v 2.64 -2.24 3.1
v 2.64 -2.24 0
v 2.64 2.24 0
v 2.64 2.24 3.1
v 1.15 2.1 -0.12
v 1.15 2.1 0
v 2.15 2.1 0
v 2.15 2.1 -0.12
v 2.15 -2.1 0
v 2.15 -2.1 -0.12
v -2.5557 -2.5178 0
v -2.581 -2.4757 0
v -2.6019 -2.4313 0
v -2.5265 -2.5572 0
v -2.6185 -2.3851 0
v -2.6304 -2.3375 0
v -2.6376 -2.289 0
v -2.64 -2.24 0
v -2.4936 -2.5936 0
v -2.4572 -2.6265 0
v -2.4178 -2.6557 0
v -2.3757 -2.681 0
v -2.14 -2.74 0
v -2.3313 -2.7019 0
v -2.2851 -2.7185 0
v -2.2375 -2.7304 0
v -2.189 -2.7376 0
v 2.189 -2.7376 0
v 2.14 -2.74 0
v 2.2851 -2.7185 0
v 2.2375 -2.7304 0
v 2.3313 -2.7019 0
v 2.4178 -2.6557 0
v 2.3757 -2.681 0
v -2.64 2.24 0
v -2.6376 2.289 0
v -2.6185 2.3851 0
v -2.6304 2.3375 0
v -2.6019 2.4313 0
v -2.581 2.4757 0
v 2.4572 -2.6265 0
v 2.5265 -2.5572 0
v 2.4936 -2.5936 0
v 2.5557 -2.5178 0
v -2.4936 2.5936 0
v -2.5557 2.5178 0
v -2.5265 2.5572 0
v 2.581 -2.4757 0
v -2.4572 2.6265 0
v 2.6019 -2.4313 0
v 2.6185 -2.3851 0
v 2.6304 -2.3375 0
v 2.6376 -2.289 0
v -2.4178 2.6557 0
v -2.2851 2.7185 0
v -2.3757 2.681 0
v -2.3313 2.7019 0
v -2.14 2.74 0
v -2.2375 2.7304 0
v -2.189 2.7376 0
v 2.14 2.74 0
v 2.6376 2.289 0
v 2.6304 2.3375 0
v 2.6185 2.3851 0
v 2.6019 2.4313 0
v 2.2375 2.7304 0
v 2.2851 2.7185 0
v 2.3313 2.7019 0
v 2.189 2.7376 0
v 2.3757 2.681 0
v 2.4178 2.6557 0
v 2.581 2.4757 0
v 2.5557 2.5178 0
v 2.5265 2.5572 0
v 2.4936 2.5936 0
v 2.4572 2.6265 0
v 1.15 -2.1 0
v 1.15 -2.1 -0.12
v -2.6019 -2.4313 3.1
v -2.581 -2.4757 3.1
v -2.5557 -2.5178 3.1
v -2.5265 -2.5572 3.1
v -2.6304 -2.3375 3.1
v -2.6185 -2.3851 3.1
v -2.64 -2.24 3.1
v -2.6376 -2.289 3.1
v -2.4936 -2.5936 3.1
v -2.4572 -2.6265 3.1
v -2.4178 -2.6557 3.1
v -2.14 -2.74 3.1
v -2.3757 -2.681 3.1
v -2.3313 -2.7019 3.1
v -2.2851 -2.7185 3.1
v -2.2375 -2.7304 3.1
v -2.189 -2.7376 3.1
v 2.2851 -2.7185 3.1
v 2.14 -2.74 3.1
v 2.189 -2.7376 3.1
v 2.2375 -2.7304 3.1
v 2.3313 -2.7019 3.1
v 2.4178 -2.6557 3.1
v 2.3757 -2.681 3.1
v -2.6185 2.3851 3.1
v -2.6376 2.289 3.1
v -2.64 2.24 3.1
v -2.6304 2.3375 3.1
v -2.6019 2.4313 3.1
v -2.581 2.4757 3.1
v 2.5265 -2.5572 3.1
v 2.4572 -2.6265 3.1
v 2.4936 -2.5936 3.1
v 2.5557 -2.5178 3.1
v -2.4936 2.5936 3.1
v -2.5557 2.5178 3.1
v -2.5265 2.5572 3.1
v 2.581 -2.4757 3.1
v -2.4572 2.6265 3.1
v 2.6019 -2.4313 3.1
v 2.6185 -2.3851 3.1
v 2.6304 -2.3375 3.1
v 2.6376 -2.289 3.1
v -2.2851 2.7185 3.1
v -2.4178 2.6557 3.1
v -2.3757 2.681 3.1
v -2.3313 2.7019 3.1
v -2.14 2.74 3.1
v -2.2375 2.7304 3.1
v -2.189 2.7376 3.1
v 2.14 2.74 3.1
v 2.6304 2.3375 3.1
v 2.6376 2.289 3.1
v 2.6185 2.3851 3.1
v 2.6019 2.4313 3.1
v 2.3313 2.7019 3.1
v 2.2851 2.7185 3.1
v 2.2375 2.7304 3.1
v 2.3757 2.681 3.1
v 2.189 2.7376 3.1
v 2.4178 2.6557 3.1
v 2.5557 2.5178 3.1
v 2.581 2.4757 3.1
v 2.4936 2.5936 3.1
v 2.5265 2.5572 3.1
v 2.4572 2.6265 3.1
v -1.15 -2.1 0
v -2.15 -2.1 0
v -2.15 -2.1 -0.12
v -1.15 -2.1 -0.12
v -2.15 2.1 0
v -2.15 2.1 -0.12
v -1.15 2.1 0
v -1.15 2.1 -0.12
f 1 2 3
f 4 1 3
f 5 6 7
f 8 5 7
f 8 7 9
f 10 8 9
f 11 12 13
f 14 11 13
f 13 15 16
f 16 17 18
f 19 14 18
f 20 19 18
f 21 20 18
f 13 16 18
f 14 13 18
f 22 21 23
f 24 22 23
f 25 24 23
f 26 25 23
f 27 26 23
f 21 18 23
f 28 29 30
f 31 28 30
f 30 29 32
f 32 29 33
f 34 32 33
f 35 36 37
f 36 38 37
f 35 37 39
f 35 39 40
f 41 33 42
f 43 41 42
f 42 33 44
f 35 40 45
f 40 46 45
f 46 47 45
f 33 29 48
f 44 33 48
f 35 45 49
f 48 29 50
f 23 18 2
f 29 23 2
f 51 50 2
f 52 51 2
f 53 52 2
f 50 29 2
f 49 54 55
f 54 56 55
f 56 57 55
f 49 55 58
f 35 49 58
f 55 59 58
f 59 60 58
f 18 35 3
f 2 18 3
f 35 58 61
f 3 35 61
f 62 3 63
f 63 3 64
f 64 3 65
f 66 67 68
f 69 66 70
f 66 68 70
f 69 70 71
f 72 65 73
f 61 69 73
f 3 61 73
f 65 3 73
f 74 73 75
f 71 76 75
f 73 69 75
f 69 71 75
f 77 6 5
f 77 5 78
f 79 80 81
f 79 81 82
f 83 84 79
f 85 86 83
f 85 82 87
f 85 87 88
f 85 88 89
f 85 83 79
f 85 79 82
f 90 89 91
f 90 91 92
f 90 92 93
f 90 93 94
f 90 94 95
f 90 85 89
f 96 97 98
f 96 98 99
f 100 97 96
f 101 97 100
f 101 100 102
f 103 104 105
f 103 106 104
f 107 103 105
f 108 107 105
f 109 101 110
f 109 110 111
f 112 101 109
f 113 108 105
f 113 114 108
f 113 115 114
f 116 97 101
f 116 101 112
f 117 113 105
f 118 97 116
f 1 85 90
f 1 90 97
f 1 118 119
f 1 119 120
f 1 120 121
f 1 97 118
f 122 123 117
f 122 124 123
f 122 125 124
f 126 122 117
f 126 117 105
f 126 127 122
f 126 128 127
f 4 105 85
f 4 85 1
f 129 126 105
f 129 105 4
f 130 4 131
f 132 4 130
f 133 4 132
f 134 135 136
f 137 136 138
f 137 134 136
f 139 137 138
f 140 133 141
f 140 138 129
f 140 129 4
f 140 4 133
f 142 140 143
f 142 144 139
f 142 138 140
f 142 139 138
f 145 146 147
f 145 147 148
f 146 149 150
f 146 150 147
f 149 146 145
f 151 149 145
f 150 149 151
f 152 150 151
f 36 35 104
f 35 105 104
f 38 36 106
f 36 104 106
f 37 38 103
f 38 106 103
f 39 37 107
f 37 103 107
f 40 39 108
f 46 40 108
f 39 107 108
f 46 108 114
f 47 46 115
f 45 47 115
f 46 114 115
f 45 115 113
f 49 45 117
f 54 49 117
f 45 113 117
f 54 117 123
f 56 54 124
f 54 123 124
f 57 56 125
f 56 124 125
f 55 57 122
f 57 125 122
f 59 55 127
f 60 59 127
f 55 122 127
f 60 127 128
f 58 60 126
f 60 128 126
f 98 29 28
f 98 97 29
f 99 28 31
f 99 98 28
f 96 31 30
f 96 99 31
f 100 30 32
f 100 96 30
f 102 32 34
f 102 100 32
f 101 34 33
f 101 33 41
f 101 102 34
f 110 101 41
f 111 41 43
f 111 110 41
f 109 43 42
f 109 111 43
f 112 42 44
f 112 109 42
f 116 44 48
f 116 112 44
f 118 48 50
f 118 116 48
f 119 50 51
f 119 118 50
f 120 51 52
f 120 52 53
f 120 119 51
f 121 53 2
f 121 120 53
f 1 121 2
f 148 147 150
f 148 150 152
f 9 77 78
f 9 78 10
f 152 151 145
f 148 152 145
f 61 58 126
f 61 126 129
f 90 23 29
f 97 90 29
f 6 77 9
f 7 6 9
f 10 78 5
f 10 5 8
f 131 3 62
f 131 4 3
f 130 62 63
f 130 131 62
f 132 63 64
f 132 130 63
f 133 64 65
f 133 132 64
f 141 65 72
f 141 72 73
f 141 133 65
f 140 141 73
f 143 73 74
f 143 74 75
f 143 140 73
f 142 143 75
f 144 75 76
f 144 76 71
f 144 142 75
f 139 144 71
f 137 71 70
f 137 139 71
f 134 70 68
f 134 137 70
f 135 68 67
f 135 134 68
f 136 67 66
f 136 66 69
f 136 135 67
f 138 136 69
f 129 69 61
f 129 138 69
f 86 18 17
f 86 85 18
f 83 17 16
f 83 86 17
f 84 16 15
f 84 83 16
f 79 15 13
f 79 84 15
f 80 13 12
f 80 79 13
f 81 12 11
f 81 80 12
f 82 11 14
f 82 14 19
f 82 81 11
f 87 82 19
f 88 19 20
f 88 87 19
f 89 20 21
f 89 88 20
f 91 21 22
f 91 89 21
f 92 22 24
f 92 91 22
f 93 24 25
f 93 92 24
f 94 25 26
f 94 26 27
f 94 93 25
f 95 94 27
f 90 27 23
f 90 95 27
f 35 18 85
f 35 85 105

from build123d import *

# Parameters (mm, degrees)
F0_W     = 5.28
F0_H     = 5.48
F1_DEPTH = 3.1
F2_R     = 0.5
F3_W     = 1
F3_H     = 4.2
F4_DEPTH = 0.12


with BuildPart() as f1:
    # F0 (on Top) → F1 (new body)
    with BuildSketch(Plane.XY):
        Rectangle(F0_W, F0_H)
    extrude(amount=F1_DEPTH)

    # F2
    f2_edges = [f1.edges().sort_by_distance(p)[0] for p in [
        (-2.64, -2.74, 1.55),
        (2.64, -2.74, 1.55),
        (2.64, 2.74, 1.55),
        (-2.64, 2.74, 1.55),
    ]]
    fillet(f2_edges, radius=F2_R)


with BuildPart() as f4:
    # F3 (on face) → F4 (new body)
    with BuildSketch(Plane(origin=(0, 0, 0), x_dir=(1, 0, 0), z_dir=(0, 0, -1))):
        with Locations((1.65, 0)):
            Rectangle(F3_W, F3_H)
        with Locations((-1.65, 0)):
            Rectangle(F3_W, F3_H)
    extrude(amount=F4_DEPTH)


solid = Compound([f1.part, f4.part])
